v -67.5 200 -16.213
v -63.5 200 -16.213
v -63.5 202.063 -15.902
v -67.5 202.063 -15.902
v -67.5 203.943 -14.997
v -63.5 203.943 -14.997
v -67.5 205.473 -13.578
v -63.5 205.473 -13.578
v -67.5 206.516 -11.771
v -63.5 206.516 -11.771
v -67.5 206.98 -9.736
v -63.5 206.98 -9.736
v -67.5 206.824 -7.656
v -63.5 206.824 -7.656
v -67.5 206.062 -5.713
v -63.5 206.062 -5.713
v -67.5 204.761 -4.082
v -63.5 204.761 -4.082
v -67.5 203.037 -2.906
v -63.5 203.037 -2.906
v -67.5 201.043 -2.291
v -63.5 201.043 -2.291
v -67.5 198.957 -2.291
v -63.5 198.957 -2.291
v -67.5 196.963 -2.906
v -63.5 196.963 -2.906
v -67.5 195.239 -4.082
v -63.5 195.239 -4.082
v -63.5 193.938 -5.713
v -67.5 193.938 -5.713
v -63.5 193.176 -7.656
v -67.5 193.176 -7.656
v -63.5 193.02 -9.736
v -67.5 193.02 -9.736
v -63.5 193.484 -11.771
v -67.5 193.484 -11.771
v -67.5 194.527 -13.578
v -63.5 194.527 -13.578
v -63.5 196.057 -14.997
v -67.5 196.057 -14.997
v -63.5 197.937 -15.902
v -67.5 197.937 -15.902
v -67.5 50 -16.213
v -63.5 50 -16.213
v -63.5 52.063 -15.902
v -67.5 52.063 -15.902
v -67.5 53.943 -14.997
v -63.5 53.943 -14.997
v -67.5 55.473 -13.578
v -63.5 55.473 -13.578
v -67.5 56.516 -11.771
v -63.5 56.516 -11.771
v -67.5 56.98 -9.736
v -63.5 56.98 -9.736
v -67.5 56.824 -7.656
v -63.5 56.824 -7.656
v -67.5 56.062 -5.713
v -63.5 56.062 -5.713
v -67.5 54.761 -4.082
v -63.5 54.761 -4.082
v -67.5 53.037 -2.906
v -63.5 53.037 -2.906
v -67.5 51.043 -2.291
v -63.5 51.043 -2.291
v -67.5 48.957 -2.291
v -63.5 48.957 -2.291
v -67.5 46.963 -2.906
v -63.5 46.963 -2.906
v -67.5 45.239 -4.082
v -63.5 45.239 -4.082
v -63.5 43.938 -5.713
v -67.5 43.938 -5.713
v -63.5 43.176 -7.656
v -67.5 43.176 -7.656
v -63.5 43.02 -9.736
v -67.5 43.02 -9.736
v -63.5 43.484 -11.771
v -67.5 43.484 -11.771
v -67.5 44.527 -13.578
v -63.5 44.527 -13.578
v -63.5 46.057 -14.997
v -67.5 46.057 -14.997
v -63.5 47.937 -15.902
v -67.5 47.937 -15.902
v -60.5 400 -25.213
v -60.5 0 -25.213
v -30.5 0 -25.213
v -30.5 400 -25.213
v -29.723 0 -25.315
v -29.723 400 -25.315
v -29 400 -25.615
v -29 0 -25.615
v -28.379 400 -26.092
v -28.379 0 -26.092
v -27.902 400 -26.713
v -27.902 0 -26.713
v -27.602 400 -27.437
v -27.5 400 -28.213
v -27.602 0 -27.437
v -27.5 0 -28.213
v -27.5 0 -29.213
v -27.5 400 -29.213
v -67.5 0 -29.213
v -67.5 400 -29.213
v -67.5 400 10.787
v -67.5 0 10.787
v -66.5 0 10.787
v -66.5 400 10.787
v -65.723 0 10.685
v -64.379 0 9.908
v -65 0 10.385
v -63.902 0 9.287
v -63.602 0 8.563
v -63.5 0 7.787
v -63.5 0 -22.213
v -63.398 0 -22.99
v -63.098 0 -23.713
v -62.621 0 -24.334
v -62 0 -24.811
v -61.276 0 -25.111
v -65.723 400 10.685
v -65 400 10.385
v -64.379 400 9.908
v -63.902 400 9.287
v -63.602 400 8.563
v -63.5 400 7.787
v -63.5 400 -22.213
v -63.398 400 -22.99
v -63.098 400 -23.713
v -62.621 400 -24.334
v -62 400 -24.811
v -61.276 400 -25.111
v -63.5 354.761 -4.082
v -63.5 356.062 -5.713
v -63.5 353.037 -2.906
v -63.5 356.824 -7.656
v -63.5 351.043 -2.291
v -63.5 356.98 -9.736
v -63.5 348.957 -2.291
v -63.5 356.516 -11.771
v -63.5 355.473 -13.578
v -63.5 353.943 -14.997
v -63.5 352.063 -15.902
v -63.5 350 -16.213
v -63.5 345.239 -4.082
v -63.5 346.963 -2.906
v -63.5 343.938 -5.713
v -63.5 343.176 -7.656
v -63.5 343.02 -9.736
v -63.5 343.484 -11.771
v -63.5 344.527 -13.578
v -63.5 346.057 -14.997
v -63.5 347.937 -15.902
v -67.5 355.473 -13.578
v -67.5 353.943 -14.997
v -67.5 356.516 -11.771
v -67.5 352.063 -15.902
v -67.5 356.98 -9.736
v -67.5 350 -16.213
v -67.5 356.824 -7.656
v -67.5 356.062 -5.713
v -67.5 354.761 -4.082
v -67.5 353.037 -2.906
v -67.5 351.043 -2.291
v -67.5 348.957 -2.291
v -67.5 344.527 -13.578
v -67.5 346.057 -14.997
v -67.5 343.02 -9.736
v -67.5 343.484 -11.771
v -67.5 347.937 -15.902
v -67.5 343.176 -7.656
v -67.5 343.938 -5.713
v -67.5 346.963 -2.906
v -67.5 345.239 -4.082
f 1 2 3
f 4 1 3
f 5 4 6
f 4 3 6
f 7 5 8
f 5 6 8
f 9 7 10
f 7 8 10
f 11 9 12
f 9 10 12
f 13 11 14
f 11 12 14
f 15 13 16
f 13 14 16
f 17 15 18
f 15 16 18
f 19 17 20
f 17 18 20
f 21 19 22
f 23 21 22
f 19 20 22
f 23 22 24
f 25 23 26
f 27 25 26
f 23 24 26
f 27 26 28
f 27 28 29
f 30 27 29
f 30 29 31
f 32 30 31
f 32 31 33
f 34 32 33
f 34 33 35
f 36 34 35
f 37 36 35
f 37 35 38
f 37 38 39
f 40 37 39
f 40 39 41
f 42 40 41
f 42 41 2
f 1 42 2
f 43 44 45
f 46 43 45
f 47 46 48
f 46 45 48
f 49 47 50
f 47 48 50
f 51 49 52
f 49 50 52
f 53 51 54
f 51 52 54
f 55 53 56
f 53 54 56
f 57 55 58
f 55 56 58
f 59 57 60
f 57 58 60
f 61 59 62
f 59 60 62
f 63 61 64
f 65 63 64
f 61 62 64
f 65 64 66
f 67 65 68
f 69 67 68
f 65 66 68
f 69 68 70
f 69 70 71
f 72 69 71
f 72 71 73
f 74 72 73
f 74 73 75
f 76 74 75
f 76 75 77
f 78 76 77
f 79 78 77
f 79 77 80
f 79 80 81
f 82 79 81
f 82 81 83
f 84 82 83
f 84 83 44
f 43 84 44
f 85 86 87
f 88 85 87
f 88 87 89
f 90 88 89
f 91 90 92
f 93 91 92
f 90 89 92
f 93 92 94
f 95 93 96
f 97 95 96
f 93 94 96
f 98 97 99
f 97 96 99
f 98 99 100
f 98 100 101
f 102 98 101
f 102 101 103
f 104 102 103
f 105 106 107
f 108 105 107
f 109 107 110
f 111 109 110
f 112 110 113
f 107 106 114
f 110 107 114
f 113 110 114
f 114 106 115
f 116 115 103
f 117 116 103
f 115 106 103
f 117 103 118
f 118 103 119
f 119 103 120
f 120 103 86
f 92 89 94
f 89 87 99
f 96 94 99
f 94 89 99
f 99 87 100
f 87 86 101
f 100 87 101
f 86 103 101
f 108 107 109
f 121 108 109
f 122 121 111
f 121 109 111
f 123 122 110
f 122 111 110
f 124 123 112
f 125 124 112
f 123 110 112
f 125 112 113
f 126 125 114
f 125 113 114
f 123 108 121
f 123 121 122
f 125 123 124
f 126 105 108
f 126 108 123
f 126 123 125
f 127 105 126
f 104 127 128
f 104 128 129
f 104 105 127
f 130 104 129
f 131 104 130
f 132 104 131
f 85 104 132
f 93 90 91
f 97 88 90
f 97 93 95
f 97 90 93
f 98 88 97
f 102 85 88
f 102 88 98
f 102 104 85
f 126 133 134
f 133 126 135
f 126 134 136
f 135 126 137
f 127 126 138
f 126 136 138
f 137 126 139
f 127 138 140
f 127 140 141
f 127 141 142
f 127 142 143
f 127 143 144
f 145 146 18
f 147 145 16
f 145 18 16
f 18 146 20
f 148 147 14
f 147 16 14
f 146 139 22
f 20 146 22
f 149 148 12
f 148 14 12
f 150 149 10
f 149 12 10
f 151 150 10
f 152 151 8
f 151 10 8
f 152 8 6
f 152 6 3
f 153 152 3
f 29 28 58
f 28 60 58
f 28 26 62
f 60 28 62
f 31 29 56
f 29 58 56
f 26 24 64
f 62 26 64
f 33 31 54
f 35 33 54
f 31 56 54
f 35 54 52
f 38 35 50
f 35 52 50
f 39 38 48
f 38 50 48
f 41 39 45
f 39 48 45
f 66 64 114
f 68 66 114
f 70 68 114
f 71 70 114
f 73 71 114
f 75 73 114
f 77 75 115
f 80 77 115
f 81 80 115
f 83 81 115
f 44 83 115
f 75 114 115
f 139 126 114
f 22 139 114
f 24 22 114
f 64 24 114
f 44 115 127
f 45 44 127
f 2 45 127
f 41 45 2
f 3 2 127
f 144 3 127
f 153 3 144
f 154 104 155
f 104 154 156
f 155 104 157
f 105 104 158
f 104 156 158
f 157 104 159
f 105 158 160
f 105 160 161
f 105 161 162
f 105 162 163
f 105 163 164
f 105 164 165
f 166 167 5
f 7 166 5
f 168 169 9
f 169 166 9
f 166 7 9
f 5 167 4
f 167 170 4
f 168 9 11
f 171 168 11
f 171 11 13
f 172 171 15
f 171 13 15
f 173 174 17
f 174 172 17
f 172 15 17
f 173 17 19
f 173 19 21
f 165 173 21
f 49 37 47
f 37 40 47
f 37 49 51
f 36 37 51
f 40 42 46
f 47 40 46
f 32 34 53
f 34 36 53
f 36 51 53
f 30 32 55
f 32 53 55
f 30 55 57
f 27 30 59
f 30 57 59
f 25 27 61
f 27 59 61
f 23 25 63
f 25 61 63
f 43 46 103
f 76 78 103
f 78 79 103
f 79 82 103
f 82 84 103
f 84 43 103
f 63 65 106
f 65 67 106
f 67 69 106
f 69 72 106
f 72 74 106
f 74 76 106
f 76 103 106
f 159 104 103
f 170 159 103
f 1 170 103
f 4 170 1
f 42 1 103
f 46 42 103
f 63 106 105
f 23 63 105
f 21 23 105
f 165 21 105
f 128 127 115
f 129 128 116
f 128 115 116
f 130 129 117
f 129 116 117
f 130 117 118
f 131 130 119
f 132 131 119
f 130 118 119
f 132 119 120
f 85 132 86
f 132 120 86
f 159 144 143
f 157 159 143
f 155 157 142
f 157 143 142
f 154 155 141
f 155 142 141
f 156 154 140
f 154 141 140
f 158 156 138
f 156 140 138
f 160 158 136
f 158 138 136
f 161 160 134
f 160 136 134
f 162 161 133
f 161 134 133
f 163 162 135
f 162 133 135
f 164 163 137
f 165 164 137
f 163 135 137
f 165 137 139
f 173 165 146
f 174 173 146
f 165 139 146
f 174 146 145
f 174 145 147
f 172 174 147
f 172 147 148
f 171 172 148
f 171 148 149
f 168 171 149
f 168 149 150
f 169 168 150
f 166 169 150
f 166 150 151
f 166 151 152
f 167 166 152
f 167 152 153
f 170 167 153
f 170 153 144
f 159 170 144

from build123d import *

# Parameters (mm, degrees)
BOSS_EXTRUDE1_DEPTH = 400
SKETCH2_R           = 7
CUT_EXTRUDE1_DEPTH  = 10


with BuildPart() as part:
    # Sketch1 → Boss-Extrude1 (new body)
    with BuildSketch(Plane(origin=(0, 0, 0), x_dir=(1, 0, 0), z_dir=(0, 1, 0))):
        with BuildLine():
            Line((-27.499872145, 29.213153277), (-67.499872145, 29.213153277))
            Line((-67.499872145, 29.213153277), (-67.499872145, -10.786846723))
            Line((-67.499872145, -10.786846723), (-66.499872145, -10.786846723))
            ThreePointArc((-66.499872145, -10.786846723), (-64.378551801, -9.908167067), (-63.499872145, -7.786846723))
            Line((-63.499872145, -7.786846723), (-63.499872145, 22.213153277))
            ThreePointArc((-63.499872145, 22.213153277), (-62.621192489, 24.334473621), (-60.499872145, 25.213153277))
            Line((-60.499872145, 25.213153277), (-30.499872145, 25.213153277))
            ThreePointArc((-30.499872145, 25.213153277), (-28.378551801, 26.091832933), (-27.499872145, 28.213153277))
            Line((-27.499872145, 28.213153277), (-27.499872145, 29.213153277))
        make_face()
    extrude(amount=BOSS_EXTRUDE1_DEPTH)

    # Sketch2 → Cut-Extrude1 (cut)
    with BuildSketch(Plane(origin=(-63.499872145, 0, 0), x_dir=(0, 0, -1), z_dir=(1, 0, 0))):
        with Locations((9.213153277, 200)):
            Circle(SKETCH2_R)
        with Locations((9.213153277, 50)):
            Circle(SKETCH2_R)
        with Locations((9.213153277, 350)):
            Circle(SKETCH2_R)
    extrude(amount=-CUT_EXTRUDE1_DEPTH, mode=Mode.SUBTRACT)


solid = part.part
